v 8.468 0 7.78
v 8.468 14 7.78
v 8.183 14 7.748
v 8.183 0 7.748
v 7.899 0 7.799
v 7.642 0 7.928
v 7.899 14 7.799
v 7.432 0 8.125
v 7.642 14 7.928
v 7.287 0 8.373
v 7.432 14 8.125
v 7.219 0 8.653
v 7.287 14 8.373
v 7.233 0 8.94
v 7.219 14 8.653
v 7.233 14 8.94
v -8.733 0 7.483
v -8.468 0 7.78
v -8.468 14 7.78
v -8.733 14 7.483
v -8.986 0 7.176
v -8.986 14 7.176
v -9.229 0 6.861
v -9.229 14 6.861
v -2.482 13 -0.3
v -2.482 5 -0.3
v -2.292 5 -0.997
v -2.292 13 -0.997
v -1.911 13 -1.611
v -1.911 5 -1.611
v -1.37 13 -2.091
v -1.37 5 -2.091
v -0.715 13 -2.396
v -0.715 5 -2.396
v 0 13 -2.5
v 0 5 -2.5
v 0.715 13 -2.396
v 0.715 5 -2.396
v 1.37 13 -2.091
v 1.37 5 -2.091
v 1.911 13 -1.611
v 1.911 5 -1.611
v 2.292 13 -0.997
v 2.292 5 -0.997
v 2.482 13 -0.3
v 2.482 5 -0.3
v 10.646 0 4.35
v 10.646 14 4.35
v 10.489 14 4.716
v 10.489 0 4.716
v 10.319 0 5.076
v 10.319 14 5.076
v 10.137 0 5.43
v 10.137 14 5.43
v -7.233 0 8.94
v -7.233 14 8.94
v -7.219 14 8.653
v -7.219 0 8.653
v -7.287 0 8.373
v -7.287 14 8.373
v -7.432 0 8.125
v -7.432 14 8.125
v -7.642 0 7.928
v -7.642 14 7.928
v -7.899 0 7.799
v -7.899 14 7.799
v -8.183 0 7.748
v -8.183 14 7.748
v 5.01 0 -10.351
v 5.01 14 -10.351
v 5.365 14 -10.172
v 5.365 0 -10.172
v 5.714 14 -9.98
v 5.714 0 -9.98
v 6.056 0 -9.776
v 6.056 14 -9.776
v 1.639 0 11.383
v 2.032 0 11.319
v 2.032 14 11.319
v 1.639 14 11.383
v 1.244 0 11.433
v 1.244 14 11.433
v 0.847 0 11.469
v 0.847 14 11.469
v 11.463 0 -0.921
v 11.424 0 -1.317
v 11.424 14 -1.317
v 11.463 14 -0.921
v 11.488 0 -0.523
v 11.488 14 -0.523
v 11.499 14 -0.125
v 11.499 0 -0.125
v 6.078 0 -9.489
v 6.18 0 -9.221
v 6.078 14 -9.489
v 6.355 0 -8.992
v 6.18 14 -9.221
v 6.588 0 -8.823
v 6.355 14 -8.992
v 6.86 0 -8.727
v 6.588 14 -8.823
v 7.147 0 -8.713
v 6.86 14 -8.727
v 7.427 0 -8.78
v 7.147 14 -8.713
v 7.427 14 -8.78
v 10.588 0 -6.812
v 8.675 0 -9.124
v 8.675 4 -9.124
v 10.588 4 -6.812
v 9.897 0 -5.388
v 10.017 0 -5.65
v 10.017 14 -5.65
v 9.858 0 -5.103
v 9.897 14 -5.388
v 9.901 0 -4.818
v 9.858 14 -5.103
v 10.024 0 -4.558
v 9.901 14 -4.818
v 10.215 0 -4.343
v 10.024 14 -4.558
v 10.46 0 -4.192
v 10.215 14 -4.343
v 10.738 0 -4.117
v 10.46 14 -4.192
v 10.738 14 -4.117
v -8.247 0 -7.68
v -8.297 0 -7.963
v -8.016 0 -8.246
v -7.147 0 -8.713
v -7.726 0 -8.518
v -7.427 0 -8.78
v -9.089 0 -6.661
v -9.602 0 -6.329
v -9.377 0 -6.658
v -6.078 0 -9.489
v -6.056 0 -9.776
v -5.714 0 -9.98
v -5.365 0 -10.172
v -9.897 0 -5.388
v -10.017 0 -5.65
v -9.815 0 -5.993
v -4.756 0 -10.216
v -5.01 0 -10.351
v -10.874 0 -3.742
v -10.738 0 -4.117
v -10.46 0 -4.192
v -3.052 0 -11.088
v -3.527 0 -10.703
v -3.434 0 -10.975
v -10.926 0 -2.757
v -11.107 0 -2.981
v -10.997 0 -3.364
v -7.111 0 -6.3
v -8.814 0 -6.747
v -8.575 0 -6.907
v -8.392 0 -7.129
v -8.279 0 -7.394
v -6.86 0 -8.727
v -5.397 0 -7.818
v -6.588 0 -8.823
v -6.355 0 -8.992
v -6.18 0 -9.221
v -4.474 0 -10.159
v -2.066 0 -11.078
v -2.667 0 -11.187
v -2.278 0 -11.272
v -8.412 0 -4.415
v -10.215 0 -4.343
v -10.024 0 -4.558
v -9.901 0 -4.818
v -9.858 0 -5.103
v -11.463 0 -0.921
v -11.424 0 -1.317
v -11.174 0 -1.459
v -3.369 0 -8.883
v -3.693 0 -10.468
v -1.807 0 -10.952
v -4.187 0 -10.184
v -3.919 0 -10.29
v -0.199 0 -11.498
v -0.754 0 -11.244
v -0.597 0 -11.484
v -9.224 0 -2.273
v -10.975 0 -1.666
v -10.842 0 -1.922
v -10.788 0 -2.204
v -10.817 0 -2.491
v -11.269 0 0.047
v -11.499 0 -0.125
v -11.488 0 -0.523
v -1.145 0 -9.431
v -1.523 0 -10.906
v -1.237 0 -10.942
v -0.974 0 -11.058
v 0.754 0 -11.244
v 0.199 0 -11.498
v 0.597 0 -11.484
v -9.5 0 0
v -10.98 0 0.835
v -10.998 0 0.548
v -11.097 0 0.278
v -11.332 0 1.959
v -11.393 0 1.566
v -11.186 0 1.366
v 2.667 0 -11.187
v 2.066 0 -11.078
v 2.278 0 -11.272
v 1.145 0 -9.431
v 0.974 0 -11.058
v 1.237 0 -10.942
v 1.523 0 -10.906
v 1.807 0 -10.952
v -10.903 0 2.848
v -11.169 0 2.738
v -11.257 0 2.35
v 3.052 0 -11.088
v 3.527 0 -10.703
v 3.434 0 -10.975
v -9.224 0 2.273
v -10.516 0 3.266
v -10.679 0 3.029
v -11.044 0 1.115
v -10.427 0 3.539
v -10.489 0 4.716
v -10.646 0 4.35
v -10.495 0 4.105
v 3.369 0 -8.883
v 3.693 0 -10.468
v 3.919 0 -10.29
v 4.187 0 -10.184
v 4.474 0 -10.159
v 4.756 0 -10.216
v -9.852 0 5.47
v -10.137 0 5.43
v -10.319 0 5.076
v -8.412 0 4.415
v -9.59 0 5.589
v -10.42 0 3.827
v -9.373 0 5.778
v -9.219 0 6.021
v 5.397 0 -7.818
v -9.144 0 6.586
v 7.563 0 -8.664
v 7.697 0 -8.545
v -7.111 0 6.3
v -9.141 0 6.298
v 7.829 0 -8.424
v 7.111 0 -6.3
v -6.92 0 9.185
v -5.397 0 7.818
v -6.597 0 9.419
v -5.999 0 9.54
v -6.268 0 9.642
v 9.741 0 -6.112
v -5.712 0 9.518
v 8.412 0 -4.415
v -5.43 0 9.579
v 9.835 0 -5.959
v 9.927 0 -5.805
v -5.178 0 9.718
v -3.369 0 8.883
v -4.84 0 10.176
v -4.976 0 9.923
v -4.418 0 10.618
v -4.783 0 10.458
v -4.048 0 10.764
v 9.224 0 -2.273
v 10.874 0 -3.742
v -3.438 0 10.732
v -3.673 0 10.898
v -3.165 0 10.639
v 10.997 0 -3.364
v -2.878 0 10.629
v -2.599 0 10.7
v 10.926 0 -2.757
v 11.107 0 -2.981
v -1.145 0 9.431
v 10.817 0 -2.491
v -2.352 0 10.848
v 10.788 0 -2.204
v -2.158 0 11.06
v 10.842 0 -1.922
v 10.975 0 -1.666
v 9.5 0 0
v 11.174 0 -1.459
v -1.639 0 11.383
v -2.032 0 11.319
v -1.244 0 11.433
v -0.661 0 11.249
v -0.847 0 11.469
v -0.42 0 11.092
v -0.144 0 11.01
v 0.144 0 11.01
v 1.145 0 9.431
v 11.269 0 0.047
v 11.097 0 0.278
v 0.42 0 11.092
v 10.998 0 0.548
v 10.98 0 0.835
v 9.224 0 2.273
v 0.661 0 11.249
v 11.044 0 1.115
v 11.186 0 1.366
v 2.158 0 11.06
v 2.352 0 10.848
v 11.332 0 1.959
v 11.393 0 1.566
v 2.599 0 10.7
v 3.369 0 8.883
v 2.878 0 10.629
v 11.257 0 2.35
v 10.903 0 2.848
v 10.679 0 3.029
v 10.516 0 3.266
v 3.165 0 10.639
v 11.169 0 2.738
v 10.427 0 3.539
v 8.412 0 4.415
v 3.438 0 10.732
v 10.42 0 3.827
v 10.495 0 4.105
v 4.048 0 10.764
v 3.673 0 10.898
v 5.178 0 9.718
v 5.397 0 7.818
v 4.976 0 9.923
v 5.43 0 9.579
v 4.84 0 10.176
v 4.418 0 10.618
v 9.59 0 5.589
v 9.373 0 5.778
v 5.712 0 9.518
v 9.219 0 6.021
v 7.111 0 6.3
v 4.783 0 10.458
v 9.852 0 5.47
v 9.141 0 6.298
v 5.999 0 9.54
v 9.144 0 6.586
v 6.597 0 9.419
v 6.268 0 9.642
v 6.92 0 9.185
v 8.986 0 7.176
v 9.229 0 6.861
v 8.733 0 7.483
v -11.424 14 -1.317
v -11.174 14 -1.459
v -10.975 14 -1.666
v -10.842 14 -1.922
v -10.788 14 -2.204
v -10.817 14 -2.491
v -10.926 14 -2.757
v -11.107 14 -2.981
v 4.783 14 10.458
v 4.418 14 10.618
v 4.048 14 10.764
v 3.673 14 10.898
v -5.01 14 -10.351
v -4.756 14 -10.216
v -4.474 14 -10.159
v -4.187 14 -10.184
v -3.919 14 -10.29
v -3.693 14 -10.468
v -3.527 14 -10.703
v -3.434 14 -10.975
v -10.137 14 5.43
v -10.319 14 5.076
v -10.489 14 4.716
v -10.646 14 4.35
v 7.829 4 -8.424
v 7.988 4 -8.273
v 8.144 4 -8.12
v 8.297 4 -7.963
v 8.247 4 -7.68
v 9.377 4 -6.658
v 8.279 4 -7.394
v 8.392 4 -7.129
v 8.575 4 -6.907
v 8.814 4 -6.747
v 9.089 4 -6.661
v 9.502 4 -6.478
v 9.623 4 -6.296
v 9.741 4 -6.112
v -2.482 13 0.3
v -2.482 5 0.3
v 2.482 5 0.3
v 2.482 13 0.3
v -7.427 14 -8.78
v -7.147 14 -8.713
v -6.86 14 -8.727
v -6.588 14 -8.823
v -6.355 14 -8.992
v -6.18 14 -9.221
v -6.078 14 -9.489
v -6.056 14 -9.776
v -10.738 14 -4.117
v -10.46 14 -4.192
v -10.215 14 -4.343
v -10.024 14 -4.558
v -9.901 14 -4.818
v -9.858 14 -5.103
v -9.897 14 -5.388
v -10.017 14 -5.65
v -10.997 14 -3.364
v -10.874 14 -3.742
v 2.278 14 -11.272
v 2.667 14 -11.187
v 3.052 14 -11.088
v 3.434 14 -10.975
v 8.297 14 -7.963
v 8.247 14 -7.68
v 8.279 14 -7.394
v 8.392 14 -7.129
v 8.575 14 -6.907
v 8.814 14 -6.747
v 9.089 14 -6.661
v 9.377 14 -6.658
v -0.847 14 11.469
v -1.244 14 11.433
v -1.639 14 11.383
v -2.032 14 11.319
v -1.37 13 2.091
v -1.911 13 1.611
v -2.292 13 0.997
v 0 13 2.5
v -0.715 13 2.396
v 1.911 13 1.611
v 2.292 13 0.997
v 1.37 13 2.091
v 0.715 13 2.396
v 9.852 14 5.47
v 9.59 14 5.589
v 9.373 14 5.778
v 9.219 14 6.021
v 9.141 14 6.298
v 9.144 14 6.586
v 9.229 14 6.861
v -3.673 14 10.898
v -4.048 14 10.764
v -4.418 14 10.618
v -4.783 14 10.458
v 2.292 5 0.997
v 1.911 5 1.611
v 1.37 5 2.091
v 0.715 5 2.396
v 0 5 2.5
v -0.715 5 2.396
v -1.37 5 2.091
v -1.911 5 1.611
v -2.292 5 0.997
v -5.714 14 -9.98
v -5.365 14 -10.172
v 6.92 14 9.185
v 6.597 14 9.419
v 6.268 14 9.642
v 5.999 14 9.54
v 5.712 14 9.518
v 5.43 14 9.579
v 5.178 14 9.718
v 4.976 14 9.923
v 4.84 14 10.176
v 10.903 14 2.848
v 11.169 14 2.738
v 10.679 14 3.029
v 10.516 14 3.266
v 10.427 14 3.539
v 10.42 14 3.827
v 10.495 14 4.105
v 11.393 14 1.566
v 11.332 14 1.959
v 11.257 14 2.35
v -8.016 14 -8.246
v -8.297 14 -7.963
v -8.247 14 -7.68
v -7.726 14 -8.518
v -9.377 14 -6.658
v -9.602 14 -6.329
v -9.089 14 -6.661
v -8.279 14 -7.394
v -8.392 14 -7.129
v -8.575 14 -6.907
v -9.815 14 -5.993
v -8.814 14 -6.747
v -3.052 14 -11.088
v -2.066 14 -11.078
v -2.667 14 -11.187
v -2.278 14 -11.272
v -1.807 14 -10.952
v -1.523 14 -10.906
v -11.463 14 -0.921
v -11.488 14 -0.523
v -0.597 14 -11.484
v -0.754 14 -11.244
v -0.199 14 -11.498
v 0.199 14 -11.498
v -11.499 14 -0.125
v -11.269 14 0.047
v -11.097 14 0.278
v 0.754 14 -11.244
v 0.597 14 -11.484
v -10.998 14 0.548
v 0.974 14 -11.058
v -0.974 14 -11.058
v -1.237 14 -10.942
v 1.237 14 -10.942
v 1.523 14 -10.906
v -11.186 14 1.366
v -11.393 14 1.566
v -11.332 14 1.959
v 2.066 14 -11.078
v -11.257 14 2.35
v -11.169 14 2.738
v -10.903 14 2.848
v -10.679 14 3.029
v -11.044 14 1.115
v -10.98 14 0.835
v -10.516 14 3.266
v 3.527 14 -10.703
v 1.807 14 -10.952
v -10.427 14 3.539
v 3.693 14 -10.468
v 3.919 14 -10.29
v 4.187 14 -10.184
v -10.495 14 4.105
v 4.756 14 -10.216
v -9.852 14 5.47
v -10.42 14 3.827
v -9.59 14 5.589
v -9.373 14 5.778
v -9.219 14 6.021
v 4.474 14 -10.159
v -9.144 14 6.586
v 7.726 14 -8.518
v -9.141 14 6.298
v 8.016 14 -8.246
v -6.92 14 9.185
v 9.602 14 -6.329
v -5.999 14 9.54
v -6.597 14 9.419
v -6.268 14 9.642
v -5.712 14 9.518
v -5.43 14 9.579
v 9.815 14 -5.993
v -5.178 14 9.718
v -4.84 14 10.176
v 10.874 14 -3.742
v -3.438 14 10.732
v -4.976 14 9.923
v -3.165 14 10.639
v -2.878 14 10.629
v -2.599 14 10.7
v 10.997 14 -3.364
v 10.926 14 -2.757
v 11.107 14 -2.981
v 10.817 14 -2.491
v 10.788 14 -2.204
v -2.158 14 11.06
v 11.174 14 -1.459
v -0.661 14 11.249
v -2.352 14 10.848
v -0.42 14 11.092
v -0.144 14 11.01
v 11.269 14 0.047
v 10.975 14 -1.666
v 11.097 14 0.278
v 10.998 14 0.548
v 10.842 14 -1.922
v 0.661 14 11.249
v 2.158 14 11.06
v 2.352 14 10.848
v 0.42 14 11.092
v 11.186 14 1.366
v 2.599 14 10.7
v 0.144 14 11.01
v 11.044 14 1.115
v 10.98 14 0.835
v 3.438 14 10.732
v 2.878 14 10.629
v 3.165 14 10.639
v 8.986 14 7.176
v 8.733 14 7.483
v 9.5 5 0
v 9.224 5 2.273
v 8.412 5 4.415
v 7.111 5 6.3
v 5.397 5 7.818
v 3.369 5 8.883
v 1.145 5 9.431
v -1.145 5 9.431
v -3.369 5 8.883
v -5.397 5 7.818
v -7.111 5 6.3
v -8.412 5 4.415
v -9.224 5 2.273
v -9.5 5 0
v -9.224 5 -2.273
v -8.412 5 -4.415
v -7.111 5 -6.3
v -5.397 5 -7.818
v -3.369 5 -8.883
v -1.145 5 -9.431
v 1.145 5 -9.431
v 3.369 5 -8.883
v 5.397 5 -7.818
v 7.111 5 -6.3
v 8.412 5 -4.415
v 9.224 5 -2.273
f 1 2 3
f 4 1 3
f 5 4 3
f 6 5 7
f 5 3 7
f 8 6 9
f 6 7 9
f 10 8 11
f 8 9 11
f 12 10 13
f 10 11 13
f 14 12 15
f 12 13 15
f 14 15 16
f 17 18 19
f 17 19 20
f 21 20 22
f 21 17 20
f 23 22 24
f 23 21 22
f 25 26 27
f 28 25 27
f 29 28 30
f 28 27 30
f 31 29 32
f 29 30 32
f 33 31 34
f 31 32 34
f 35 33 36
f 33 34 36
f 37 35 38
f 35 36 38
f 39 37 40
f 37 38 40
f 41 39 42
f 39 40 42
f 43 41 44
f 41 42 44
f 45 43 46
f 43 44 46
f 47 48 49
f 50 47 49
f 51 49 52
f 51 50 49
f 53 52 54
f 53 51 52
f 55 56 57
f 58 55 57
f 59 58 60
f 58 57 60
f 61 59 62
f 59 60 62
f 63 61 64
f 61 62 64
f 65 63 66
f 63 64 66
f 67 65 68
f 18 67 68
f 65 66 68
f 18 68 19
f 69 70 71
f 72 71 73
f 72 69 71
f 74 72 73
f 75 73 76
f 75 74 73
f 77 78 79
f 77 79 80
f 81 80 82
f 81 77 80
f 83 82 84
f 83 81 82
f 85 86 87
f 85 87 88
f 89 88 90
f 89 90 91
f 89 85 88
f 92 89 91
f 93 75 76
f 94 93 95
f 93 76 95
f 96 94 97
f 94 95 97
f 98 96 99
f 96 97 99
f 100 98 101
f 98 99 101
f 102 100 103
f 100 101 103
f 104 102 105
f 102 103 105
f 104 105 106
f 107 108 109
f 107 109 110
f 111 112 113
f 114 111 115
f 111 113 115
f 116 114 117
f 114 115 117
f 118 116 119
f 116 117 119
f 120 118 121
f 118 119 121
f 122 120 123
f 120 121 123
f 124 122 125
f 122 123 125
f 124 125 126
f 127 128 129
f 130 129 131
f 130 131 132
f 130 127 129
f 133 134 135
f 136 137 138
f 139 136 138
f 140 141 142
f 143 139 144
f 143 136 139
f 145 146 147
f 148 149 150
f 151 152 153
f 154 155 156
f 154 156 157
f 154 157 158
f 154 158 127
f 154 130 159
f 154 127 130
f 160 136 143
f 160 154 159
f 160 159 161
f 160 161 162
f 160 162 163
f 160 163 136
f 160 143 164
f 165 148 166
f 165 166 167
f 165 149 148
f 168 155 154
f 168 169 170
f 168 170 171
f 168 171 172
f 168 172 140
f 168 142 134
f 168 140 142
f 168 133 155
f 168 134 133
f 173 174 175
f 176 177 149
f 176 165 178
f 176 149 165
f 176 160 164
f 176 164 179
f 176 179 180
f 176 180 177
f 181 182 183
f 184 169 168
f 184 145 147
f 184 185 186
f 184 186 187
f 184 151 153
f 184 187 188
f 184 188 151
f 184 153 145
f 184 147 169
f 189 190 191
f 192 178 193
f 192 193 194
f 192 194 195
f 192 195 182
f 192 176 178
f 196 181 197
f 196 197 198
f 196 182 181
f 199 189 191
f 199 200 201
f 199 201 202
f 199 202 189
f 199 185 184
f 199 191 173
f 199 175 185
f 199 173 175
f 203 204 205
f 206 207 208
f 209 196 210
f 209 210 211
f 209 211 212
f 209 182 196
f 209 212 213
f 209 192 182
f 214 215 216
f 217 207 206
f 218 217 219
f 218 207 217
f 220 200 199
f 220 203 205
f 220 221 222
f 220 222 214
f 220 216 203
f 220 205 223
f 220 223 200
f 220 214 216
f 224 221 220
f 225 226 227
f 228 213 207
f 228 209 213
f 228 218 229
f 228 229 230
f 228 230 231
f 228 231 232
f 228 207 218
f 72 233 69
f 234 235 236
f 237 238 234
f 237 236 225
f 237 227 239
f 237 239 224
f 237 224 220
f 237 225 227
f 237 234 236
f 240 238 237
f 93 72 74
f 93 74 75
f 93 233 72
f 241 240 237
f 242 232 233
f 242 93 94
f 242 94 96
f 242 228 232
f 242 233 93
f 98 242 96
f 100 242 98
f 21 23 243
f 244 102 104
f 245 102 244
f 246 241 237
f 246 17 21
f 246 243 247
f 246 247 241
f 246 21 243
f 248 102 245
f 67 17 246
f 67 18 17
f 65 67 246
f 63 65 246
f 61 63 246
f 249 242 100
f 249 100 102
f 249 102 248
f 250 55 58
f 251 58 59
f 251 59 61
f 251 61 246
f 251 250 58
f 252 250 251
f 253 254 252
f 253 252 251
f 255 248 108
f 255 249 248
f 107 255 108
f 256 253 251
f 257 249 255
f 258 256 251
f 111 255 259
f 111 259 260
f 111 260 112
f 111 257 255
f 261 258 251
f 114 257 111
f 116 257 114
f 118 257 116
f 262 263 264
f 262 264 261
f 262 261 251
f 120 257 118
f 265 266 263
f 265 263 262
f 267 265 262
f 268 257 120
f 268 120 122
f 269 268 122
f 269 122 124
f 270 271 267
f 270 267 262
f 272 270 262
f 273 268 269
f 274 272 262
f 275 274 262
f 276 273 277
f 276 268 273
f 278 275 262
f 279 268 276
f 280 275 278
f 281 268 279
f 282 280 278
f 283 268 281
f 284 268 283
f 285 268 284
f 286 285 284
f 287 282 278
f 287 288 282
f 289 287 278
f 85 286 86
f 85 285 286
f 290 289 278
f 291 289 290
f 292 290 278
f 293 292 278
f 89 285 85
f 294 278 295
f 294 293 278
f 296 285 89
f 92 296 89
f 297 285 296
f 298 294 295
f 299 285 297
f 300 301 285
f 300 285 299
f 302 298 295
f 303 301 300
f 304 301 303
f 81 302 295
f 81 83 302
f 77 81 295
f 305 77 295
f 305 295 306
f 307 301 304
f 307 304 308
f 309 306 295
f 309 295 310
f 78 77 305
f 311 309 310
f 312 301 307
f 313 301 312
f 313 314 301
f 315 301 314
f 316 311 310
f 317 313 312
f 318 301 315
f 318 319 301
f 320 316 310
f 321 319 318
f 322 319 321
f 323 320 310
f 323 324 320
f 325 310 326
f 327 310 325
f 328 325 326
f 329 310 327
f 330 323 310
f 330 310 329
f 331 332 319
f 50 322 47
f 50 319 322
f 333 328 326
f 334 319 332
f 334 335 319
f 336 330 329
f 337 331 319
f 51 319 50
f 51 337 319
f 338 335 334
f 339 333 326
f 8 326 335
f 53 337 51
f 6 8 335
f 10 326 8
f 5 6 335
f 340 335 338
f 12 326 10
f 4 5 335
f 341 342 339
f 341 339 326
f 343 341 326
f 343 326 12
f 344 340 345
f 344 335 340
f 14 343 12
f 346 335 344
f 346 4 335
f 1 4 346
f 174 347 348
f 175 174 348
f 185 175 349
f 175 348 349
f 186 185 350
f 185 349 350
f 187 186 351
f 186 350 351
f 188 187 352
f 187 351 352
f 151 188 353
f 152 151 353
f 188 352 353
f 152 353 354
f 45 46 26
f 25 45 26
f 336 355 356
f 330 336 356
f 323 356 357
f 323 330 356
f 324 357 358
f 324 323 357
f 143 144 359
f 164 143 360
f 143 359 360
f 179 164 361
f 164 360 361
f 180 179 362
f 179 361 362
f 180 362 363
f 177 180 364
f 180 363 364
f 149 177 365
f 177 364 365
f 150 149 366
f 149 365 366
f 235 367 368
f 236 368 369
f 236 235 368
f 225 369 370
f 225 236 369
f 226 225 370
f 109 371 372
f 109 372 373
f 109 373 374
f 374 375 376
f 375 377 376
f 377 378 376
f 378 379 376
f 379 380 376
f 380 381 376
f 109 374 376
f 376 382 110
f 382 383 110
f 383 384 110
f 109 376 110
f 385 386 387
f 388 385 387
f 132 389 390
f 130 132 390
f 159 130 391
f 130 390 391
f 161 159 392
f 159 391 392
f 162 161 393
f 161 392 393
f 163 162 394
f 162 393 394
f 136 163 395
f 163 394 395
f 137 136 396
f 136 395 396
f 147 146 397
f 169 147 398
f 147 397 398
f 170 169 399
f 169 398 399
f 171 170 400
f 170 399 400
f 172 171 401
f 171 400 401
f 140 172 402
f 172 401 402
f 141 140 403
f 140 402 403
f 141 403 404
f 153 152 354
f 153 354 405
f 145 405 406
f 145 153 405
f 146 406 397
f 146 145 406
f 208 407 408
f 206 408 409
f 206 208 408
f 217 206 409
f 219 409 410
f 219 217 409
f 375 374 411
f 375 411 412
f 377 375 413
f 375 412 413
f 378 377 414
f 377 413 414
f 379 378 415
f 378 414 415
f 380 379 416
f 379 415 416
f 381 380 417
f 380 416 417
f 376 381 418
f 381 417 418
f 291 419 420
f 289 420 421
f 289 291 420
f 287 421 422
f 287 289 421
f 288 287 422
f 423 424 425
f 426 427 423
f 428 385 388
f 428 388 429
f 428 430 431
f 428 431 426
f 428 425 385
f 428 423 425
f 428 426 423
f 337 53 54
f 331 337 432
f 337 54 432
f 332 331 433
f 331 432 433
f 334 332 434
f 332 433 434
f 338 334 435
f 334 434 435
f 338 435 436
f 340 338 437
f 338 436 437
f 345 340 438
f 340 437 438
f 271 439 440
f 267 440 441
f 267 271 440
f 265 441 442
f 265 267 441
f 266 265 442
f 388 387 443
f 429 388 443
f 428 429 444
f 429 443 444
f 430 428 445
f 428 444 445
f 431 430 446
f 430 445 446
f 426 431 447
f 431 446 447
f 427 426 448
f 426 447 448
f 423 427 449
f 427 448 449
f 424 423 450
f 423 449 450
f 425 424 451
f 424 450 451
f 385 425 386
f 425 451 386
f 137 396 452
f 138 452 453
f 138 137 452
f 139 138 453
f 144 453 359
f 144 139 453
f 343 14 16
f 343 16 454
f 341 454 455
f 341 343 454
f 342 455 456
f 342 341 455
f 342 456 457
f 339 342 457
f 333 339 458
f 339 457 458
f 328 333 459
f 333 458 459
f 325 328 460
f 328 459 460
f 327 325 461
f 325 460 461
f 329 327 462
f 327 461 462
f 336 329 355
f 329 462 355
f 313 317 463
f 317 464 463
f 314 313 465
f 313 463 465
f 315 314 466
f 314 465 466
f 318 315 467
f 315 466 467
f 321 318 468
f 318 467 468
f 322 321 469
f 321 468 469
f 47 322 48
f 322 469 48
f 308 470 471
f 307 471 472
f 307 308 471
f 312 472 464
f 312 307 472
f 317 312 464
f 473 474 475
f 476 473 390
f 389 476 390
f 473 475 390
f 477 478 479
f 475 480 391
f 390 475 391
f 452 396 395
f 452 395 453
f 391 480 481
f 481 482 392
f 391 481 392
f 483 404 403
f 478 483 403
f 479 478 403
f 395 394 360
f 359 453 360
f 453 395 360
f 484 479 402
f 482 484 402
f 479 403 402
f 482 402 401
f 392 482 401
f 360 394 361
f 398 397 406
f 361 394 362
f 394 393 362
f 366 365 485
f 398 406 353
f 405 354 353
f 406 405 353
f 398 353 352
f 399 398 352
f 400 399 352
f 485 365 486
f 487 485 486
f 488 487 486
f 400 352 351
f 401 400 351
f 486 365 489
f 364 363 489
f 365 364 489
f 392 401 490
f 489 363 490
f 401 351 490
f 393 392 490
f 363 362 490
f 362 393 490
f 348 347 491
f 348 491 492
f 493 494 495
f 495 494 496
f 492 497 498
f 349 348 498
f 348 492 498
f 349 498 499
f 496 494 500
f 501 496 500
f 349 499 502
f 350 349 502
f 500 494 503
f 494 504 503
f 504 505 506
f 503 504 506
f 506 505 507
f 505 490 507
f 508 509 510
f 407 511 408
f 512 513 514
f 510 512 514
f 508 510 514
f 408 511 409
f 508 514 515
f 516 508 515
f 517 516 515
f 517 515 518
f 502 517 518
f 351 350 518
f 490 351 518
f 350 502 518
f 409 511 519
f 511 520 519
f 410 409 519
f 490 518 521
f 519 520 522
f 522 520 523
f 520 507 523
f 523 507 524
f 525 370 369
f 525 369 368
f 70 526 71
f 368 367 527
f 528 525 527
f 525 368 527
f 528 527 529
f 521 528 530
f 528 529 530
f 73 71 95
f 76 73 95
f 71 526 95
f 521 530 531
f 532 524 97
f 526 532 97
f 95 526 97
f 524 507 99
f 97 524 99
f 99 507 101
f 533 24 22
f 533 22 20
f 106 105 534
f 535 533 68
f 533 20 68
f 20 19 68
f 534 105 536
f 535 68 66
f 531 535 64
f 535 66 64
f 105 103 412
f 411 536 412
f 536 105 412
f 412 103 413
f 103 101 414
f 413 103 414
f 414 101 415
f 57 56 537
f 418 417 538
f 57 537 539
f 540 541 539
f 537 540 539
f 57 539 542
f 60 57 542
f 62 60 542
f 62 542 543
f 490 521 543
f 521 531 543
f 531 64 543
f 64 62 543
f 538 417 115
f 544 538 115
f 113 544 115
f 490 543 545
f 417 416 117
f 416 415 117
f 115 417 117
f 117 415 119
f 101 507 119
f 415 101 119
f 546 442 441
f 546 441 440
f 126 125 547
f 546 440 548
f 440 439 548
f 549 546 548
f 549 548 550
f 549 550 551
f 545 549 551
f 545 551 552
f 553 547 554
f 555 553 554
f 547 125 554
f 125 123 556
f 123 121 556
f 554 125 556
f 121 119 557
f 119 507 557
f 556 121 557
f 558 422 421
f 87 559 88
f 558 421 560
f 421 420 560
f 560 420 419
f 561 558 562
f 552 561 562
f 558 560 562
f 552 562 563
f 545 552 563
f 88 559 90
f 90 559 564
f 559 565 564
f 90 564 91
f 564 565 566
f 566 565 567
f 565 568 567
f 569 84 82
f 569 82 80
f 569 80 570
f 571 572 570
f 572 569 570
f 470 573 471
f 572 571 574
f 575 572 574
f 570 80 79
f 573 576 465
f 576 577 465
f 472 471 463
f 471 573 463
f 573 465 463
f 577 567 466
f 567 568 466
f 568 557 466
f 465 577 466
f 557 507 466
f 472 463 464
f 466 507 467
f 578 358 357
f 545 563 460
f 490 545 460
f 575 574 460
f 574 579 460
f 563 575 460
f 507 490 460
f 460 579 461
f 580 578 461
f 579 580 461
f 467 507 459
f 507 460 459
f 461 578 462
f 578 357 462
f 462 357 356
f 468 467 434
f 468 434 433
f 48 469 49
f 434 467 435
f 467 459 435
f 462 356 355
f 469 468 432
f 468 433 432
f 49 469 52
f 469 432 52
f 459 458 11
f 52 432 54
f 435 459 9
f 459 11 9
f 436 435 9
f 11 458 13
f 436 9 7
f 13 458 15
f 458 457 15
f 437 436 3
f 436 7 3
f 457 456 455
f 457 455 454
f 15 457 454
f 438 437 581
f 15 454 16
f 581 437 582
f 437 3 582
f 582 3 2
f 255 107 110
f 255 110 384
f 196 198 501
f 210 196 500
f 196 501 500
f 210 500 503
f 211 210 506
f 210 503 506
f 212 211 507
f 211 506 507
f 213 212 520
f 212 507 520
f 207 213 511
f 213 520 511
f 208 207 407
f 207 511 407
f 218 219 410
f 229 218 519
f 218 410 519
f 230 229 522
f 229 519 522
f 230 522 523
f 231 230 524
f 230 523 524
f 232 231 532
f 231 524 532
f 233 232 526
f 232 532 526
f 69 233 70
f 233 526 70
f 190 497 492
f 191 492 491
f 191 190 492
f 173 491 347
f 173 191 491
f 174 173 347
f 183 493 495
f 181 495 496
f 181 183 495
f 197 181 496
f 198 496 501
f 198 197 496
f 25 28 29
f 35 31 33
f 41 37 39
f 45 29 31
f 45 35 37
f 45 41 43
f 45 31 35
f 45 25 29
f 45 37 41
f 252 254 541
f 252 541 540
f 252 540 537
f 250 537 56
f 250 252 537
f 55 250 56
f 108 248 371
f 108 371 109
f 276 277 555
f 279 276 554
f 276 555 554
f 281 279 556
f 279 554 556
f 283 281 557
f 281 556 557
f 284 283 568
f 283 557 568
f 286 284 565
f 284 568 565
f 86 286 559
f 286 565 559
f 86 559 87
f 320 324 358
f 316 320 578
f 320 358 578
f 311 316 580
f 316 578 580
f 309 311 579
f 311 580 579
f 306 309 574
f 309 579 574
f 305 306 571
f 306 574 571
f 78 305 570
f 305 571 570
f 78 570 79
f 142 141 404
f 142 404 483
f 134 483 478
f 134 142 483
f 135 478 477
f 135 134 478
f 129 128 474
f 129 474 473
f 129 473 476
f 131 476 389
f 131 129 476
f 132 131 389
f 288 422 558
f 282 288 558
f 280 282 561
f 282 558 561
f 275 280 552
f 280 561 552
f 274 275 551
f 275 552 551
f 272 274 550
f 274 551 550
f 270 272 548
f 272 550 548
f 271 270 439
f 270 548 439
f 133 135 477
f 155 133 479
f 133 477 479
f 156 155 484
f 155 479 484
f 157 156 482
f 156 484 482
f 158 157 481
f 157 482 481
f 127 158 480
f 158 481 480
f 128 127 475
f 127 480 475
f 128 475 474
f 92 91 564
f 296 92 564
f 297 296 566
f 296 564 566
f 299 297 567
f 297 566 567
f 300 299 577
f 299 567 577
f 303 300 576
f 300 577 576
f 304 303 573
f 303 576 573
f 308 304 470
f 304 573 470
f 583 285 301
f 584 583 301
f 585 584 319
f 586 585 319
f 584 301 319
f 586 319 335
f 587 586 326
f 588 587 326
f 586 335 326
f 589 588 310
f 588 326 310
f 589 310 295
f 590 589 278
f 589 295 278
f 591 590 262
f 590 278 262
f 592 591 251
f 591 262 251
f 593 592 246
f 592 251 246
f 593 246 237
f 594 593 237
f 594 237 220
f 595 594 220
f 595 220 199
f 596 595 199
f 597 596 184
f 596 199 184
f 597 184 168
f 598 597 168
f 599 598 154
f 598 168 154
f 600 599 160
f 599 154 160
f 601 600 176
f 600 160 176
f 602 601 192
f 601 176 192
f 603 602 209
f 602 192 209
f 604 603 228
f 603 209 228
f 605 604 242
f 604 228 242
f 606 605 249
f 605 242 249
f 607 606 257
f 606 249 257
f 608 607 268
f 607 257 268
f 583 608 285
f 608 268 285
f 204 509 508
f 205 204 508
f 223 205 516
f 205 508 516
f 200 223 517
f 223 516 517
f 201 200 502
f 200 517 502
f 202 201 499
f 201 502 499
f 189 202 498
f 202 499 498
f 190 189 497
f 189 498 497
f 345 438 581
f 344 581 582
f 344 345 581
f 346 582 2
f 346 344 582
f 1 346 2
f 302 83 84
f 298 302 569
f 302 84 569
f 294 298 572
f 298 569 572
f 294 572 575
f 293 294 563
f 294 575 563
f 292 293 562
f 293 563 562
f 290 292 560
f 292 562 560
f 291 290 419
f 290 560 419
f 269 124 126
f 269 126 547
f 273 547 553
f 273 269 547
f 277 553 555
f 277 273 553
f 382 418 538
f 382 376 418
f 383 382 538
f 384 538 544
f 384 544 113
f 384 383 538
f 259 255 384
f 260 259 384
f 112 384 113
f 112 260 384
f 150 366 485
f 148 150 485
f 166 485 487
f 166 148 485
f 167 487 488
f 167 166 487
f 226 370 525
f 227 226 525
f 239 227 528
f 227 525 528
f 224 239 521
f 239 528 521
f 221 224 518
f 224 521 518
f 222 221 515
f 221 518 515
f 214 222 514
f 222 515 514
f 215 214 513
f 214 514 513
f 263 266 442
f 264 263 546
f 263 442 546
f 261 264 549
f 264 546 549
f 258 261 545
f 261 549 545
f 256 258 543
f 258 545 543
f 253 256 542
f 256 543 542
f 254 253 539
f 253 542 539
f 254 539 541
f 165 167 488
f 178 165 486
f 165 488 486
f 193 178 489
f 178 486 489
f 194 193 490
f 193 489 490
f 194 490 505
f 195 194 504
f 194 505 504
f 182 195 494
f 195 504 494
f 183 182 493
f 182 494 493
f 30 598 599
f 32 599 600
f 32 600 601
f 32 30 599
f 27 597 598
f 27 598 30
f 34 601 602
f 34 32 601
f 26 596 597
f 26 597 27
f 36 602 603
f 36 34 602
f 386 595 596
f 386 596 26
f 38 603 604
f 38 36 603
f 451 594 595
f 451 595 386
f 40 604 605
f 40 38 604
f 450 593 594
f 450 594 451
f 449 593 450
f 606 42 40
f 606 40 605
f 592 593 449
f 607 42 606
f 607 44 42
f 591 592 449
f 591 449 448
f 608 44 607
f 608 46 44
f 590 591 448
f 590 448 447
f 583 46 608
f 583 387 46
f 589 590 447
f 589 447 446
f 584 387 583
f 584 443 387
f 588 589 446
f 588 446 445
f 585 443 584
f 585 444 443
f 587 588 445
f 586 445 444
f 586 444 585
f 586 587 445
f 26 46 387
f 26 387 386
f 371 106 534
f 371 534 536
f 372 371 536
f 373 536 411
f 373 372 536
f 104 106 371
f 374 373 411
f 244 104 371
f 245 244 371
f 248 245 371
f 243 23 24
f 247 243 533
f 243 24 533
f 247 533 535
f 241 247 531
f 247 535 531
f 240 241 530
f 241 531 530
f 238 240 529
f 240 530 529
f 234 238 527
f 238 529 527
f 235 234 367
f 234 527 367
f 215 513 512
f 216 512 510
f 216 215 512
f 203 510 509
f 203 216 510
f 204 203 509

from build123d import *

# Parameters (mm, degrees)
F0_R     = 11.5
F1_DEPTH = 14
F2_R     = 9.5
F3_DEPTH = 5
F5_DEPTH = 8
F6_R     = 1
F7_DEPTH = 14.001
F9_DEPTH = 4


with BuildPart() as f1:
    # F0 (on Front) → F1 (new body)
    with BuildSketch(Plane.XZ):
        Circle(F0_R)
    extrude(amount=-F1_DEPTH)

    # F2 (on face) → F3 (cut)
    with BuildSketch(Plane.XZ):
        Circle(F2_R)
    extrude(amount=-F3_DEPTH, mode=Mode.SUBTRACT)

    # F4 (on face) → F5 (cut)
    with BuildSketch(Plane.XZ.offset(-5)):
        with BuildLine():
            Line((-2.481935, 0.3), (2.481935, 0.3))
            ThreePointArc((2.481935, 0.3), (0, 2.5), (-2.481935, 0.3))
        make_face()
        with BuildLine():
            Line((2.481935, -0.3), (-2.481935, -0.3))
            ThreePointArc((-2.481935, -0.3), (0, -2.5), (2.481935, -0.3))
        make_face()
    extrude(amount=-F5_DEPTH, mode=Mode.SUBTRACT)

    # F6 (on face) → F7 (cut, through all)
    with BuildSketch(Plane(origin=(0, 14, 0), x_dir=(-1, 0, 0), z_dir=(0, 1, 0))):
        with Locations((0, 12)):
            Circle(F6_R)
        with Locations((-2.984279, 11.622998)):
            Circle(F6_R)
        with Locations((-5.781044, 10.51568)):
            Circle(F6_R)
        with Locations((-8.214565, 8.747624)):
            Circle(F6_R)
        with Locations((-10.131935, 6.429922)):
            Circle(F6_R)
        with Locations((-11.412678, 3.708204)):
            Circle(F6_R)
        with Locations((-11.976321, 0.753486)):
            Circle(F6_R)
        with Locations((-11.787447, -2.248576)):
            Circle(F6_R)
        with Locations((-10.857925, -5.109351)):
            Circle(F6_R)
        with Locations((-9.246159, -7.649088)):
            Circle(F6_R)
        with Locations((-7.053423, -9.708204)):
            Circle(F6_R)
        with Locations((-4.417495, -11.157318)):
            Circle(F6_R)
        with Locations((-1.503999, -11.905376)):
            Circle(F6_R)
        with Locations((1.503999, -11.905376)):
            Circle(F6_R)
        with Locations((4.417495, -11.157318)):
            Circle(F6_R)
        with Locations((7.053423, -9.708204)):
            Circle(F6_R)
        with Locations((9.246159, -7.649088)):
            Circle(F6_R)
        with Locations((10.857925, -5.109351)):
            Circle(F6_R)
        with Locations((11.787447, -2.248576)):
            Circle(F6_R)
        with Locations((11.976321, 0.753486)):
            Circle(F6_R)
        with Locations((11.412678, 3.708204)):
            Circle(F6_R)
        with Locations((10.131935, 6.429922)):
            Circle(F6_R)
        with Locations((8.214565, 8.747624)):
            Circle(F6_R)
        with Locations((5.781044, 10.51568)):
            Circle(F6_R)
        with Locations((2.984279, 11.622998)):
            Circle(F6_R)
    extrude(amount=-F7_DEPTH, mode=Mode.SUBTRACT)

    # F8 (on face) → F9 (join)
    with BuildSketch(Plane.XZ):
        Polygon((8.67528, -9.12357), (10.587552, -6.81203), (8.661268, -5.21847), (6.748996, -7.53001), align=None)
    extrude(amount=-F9_DEPTH)


solid = f1.part
